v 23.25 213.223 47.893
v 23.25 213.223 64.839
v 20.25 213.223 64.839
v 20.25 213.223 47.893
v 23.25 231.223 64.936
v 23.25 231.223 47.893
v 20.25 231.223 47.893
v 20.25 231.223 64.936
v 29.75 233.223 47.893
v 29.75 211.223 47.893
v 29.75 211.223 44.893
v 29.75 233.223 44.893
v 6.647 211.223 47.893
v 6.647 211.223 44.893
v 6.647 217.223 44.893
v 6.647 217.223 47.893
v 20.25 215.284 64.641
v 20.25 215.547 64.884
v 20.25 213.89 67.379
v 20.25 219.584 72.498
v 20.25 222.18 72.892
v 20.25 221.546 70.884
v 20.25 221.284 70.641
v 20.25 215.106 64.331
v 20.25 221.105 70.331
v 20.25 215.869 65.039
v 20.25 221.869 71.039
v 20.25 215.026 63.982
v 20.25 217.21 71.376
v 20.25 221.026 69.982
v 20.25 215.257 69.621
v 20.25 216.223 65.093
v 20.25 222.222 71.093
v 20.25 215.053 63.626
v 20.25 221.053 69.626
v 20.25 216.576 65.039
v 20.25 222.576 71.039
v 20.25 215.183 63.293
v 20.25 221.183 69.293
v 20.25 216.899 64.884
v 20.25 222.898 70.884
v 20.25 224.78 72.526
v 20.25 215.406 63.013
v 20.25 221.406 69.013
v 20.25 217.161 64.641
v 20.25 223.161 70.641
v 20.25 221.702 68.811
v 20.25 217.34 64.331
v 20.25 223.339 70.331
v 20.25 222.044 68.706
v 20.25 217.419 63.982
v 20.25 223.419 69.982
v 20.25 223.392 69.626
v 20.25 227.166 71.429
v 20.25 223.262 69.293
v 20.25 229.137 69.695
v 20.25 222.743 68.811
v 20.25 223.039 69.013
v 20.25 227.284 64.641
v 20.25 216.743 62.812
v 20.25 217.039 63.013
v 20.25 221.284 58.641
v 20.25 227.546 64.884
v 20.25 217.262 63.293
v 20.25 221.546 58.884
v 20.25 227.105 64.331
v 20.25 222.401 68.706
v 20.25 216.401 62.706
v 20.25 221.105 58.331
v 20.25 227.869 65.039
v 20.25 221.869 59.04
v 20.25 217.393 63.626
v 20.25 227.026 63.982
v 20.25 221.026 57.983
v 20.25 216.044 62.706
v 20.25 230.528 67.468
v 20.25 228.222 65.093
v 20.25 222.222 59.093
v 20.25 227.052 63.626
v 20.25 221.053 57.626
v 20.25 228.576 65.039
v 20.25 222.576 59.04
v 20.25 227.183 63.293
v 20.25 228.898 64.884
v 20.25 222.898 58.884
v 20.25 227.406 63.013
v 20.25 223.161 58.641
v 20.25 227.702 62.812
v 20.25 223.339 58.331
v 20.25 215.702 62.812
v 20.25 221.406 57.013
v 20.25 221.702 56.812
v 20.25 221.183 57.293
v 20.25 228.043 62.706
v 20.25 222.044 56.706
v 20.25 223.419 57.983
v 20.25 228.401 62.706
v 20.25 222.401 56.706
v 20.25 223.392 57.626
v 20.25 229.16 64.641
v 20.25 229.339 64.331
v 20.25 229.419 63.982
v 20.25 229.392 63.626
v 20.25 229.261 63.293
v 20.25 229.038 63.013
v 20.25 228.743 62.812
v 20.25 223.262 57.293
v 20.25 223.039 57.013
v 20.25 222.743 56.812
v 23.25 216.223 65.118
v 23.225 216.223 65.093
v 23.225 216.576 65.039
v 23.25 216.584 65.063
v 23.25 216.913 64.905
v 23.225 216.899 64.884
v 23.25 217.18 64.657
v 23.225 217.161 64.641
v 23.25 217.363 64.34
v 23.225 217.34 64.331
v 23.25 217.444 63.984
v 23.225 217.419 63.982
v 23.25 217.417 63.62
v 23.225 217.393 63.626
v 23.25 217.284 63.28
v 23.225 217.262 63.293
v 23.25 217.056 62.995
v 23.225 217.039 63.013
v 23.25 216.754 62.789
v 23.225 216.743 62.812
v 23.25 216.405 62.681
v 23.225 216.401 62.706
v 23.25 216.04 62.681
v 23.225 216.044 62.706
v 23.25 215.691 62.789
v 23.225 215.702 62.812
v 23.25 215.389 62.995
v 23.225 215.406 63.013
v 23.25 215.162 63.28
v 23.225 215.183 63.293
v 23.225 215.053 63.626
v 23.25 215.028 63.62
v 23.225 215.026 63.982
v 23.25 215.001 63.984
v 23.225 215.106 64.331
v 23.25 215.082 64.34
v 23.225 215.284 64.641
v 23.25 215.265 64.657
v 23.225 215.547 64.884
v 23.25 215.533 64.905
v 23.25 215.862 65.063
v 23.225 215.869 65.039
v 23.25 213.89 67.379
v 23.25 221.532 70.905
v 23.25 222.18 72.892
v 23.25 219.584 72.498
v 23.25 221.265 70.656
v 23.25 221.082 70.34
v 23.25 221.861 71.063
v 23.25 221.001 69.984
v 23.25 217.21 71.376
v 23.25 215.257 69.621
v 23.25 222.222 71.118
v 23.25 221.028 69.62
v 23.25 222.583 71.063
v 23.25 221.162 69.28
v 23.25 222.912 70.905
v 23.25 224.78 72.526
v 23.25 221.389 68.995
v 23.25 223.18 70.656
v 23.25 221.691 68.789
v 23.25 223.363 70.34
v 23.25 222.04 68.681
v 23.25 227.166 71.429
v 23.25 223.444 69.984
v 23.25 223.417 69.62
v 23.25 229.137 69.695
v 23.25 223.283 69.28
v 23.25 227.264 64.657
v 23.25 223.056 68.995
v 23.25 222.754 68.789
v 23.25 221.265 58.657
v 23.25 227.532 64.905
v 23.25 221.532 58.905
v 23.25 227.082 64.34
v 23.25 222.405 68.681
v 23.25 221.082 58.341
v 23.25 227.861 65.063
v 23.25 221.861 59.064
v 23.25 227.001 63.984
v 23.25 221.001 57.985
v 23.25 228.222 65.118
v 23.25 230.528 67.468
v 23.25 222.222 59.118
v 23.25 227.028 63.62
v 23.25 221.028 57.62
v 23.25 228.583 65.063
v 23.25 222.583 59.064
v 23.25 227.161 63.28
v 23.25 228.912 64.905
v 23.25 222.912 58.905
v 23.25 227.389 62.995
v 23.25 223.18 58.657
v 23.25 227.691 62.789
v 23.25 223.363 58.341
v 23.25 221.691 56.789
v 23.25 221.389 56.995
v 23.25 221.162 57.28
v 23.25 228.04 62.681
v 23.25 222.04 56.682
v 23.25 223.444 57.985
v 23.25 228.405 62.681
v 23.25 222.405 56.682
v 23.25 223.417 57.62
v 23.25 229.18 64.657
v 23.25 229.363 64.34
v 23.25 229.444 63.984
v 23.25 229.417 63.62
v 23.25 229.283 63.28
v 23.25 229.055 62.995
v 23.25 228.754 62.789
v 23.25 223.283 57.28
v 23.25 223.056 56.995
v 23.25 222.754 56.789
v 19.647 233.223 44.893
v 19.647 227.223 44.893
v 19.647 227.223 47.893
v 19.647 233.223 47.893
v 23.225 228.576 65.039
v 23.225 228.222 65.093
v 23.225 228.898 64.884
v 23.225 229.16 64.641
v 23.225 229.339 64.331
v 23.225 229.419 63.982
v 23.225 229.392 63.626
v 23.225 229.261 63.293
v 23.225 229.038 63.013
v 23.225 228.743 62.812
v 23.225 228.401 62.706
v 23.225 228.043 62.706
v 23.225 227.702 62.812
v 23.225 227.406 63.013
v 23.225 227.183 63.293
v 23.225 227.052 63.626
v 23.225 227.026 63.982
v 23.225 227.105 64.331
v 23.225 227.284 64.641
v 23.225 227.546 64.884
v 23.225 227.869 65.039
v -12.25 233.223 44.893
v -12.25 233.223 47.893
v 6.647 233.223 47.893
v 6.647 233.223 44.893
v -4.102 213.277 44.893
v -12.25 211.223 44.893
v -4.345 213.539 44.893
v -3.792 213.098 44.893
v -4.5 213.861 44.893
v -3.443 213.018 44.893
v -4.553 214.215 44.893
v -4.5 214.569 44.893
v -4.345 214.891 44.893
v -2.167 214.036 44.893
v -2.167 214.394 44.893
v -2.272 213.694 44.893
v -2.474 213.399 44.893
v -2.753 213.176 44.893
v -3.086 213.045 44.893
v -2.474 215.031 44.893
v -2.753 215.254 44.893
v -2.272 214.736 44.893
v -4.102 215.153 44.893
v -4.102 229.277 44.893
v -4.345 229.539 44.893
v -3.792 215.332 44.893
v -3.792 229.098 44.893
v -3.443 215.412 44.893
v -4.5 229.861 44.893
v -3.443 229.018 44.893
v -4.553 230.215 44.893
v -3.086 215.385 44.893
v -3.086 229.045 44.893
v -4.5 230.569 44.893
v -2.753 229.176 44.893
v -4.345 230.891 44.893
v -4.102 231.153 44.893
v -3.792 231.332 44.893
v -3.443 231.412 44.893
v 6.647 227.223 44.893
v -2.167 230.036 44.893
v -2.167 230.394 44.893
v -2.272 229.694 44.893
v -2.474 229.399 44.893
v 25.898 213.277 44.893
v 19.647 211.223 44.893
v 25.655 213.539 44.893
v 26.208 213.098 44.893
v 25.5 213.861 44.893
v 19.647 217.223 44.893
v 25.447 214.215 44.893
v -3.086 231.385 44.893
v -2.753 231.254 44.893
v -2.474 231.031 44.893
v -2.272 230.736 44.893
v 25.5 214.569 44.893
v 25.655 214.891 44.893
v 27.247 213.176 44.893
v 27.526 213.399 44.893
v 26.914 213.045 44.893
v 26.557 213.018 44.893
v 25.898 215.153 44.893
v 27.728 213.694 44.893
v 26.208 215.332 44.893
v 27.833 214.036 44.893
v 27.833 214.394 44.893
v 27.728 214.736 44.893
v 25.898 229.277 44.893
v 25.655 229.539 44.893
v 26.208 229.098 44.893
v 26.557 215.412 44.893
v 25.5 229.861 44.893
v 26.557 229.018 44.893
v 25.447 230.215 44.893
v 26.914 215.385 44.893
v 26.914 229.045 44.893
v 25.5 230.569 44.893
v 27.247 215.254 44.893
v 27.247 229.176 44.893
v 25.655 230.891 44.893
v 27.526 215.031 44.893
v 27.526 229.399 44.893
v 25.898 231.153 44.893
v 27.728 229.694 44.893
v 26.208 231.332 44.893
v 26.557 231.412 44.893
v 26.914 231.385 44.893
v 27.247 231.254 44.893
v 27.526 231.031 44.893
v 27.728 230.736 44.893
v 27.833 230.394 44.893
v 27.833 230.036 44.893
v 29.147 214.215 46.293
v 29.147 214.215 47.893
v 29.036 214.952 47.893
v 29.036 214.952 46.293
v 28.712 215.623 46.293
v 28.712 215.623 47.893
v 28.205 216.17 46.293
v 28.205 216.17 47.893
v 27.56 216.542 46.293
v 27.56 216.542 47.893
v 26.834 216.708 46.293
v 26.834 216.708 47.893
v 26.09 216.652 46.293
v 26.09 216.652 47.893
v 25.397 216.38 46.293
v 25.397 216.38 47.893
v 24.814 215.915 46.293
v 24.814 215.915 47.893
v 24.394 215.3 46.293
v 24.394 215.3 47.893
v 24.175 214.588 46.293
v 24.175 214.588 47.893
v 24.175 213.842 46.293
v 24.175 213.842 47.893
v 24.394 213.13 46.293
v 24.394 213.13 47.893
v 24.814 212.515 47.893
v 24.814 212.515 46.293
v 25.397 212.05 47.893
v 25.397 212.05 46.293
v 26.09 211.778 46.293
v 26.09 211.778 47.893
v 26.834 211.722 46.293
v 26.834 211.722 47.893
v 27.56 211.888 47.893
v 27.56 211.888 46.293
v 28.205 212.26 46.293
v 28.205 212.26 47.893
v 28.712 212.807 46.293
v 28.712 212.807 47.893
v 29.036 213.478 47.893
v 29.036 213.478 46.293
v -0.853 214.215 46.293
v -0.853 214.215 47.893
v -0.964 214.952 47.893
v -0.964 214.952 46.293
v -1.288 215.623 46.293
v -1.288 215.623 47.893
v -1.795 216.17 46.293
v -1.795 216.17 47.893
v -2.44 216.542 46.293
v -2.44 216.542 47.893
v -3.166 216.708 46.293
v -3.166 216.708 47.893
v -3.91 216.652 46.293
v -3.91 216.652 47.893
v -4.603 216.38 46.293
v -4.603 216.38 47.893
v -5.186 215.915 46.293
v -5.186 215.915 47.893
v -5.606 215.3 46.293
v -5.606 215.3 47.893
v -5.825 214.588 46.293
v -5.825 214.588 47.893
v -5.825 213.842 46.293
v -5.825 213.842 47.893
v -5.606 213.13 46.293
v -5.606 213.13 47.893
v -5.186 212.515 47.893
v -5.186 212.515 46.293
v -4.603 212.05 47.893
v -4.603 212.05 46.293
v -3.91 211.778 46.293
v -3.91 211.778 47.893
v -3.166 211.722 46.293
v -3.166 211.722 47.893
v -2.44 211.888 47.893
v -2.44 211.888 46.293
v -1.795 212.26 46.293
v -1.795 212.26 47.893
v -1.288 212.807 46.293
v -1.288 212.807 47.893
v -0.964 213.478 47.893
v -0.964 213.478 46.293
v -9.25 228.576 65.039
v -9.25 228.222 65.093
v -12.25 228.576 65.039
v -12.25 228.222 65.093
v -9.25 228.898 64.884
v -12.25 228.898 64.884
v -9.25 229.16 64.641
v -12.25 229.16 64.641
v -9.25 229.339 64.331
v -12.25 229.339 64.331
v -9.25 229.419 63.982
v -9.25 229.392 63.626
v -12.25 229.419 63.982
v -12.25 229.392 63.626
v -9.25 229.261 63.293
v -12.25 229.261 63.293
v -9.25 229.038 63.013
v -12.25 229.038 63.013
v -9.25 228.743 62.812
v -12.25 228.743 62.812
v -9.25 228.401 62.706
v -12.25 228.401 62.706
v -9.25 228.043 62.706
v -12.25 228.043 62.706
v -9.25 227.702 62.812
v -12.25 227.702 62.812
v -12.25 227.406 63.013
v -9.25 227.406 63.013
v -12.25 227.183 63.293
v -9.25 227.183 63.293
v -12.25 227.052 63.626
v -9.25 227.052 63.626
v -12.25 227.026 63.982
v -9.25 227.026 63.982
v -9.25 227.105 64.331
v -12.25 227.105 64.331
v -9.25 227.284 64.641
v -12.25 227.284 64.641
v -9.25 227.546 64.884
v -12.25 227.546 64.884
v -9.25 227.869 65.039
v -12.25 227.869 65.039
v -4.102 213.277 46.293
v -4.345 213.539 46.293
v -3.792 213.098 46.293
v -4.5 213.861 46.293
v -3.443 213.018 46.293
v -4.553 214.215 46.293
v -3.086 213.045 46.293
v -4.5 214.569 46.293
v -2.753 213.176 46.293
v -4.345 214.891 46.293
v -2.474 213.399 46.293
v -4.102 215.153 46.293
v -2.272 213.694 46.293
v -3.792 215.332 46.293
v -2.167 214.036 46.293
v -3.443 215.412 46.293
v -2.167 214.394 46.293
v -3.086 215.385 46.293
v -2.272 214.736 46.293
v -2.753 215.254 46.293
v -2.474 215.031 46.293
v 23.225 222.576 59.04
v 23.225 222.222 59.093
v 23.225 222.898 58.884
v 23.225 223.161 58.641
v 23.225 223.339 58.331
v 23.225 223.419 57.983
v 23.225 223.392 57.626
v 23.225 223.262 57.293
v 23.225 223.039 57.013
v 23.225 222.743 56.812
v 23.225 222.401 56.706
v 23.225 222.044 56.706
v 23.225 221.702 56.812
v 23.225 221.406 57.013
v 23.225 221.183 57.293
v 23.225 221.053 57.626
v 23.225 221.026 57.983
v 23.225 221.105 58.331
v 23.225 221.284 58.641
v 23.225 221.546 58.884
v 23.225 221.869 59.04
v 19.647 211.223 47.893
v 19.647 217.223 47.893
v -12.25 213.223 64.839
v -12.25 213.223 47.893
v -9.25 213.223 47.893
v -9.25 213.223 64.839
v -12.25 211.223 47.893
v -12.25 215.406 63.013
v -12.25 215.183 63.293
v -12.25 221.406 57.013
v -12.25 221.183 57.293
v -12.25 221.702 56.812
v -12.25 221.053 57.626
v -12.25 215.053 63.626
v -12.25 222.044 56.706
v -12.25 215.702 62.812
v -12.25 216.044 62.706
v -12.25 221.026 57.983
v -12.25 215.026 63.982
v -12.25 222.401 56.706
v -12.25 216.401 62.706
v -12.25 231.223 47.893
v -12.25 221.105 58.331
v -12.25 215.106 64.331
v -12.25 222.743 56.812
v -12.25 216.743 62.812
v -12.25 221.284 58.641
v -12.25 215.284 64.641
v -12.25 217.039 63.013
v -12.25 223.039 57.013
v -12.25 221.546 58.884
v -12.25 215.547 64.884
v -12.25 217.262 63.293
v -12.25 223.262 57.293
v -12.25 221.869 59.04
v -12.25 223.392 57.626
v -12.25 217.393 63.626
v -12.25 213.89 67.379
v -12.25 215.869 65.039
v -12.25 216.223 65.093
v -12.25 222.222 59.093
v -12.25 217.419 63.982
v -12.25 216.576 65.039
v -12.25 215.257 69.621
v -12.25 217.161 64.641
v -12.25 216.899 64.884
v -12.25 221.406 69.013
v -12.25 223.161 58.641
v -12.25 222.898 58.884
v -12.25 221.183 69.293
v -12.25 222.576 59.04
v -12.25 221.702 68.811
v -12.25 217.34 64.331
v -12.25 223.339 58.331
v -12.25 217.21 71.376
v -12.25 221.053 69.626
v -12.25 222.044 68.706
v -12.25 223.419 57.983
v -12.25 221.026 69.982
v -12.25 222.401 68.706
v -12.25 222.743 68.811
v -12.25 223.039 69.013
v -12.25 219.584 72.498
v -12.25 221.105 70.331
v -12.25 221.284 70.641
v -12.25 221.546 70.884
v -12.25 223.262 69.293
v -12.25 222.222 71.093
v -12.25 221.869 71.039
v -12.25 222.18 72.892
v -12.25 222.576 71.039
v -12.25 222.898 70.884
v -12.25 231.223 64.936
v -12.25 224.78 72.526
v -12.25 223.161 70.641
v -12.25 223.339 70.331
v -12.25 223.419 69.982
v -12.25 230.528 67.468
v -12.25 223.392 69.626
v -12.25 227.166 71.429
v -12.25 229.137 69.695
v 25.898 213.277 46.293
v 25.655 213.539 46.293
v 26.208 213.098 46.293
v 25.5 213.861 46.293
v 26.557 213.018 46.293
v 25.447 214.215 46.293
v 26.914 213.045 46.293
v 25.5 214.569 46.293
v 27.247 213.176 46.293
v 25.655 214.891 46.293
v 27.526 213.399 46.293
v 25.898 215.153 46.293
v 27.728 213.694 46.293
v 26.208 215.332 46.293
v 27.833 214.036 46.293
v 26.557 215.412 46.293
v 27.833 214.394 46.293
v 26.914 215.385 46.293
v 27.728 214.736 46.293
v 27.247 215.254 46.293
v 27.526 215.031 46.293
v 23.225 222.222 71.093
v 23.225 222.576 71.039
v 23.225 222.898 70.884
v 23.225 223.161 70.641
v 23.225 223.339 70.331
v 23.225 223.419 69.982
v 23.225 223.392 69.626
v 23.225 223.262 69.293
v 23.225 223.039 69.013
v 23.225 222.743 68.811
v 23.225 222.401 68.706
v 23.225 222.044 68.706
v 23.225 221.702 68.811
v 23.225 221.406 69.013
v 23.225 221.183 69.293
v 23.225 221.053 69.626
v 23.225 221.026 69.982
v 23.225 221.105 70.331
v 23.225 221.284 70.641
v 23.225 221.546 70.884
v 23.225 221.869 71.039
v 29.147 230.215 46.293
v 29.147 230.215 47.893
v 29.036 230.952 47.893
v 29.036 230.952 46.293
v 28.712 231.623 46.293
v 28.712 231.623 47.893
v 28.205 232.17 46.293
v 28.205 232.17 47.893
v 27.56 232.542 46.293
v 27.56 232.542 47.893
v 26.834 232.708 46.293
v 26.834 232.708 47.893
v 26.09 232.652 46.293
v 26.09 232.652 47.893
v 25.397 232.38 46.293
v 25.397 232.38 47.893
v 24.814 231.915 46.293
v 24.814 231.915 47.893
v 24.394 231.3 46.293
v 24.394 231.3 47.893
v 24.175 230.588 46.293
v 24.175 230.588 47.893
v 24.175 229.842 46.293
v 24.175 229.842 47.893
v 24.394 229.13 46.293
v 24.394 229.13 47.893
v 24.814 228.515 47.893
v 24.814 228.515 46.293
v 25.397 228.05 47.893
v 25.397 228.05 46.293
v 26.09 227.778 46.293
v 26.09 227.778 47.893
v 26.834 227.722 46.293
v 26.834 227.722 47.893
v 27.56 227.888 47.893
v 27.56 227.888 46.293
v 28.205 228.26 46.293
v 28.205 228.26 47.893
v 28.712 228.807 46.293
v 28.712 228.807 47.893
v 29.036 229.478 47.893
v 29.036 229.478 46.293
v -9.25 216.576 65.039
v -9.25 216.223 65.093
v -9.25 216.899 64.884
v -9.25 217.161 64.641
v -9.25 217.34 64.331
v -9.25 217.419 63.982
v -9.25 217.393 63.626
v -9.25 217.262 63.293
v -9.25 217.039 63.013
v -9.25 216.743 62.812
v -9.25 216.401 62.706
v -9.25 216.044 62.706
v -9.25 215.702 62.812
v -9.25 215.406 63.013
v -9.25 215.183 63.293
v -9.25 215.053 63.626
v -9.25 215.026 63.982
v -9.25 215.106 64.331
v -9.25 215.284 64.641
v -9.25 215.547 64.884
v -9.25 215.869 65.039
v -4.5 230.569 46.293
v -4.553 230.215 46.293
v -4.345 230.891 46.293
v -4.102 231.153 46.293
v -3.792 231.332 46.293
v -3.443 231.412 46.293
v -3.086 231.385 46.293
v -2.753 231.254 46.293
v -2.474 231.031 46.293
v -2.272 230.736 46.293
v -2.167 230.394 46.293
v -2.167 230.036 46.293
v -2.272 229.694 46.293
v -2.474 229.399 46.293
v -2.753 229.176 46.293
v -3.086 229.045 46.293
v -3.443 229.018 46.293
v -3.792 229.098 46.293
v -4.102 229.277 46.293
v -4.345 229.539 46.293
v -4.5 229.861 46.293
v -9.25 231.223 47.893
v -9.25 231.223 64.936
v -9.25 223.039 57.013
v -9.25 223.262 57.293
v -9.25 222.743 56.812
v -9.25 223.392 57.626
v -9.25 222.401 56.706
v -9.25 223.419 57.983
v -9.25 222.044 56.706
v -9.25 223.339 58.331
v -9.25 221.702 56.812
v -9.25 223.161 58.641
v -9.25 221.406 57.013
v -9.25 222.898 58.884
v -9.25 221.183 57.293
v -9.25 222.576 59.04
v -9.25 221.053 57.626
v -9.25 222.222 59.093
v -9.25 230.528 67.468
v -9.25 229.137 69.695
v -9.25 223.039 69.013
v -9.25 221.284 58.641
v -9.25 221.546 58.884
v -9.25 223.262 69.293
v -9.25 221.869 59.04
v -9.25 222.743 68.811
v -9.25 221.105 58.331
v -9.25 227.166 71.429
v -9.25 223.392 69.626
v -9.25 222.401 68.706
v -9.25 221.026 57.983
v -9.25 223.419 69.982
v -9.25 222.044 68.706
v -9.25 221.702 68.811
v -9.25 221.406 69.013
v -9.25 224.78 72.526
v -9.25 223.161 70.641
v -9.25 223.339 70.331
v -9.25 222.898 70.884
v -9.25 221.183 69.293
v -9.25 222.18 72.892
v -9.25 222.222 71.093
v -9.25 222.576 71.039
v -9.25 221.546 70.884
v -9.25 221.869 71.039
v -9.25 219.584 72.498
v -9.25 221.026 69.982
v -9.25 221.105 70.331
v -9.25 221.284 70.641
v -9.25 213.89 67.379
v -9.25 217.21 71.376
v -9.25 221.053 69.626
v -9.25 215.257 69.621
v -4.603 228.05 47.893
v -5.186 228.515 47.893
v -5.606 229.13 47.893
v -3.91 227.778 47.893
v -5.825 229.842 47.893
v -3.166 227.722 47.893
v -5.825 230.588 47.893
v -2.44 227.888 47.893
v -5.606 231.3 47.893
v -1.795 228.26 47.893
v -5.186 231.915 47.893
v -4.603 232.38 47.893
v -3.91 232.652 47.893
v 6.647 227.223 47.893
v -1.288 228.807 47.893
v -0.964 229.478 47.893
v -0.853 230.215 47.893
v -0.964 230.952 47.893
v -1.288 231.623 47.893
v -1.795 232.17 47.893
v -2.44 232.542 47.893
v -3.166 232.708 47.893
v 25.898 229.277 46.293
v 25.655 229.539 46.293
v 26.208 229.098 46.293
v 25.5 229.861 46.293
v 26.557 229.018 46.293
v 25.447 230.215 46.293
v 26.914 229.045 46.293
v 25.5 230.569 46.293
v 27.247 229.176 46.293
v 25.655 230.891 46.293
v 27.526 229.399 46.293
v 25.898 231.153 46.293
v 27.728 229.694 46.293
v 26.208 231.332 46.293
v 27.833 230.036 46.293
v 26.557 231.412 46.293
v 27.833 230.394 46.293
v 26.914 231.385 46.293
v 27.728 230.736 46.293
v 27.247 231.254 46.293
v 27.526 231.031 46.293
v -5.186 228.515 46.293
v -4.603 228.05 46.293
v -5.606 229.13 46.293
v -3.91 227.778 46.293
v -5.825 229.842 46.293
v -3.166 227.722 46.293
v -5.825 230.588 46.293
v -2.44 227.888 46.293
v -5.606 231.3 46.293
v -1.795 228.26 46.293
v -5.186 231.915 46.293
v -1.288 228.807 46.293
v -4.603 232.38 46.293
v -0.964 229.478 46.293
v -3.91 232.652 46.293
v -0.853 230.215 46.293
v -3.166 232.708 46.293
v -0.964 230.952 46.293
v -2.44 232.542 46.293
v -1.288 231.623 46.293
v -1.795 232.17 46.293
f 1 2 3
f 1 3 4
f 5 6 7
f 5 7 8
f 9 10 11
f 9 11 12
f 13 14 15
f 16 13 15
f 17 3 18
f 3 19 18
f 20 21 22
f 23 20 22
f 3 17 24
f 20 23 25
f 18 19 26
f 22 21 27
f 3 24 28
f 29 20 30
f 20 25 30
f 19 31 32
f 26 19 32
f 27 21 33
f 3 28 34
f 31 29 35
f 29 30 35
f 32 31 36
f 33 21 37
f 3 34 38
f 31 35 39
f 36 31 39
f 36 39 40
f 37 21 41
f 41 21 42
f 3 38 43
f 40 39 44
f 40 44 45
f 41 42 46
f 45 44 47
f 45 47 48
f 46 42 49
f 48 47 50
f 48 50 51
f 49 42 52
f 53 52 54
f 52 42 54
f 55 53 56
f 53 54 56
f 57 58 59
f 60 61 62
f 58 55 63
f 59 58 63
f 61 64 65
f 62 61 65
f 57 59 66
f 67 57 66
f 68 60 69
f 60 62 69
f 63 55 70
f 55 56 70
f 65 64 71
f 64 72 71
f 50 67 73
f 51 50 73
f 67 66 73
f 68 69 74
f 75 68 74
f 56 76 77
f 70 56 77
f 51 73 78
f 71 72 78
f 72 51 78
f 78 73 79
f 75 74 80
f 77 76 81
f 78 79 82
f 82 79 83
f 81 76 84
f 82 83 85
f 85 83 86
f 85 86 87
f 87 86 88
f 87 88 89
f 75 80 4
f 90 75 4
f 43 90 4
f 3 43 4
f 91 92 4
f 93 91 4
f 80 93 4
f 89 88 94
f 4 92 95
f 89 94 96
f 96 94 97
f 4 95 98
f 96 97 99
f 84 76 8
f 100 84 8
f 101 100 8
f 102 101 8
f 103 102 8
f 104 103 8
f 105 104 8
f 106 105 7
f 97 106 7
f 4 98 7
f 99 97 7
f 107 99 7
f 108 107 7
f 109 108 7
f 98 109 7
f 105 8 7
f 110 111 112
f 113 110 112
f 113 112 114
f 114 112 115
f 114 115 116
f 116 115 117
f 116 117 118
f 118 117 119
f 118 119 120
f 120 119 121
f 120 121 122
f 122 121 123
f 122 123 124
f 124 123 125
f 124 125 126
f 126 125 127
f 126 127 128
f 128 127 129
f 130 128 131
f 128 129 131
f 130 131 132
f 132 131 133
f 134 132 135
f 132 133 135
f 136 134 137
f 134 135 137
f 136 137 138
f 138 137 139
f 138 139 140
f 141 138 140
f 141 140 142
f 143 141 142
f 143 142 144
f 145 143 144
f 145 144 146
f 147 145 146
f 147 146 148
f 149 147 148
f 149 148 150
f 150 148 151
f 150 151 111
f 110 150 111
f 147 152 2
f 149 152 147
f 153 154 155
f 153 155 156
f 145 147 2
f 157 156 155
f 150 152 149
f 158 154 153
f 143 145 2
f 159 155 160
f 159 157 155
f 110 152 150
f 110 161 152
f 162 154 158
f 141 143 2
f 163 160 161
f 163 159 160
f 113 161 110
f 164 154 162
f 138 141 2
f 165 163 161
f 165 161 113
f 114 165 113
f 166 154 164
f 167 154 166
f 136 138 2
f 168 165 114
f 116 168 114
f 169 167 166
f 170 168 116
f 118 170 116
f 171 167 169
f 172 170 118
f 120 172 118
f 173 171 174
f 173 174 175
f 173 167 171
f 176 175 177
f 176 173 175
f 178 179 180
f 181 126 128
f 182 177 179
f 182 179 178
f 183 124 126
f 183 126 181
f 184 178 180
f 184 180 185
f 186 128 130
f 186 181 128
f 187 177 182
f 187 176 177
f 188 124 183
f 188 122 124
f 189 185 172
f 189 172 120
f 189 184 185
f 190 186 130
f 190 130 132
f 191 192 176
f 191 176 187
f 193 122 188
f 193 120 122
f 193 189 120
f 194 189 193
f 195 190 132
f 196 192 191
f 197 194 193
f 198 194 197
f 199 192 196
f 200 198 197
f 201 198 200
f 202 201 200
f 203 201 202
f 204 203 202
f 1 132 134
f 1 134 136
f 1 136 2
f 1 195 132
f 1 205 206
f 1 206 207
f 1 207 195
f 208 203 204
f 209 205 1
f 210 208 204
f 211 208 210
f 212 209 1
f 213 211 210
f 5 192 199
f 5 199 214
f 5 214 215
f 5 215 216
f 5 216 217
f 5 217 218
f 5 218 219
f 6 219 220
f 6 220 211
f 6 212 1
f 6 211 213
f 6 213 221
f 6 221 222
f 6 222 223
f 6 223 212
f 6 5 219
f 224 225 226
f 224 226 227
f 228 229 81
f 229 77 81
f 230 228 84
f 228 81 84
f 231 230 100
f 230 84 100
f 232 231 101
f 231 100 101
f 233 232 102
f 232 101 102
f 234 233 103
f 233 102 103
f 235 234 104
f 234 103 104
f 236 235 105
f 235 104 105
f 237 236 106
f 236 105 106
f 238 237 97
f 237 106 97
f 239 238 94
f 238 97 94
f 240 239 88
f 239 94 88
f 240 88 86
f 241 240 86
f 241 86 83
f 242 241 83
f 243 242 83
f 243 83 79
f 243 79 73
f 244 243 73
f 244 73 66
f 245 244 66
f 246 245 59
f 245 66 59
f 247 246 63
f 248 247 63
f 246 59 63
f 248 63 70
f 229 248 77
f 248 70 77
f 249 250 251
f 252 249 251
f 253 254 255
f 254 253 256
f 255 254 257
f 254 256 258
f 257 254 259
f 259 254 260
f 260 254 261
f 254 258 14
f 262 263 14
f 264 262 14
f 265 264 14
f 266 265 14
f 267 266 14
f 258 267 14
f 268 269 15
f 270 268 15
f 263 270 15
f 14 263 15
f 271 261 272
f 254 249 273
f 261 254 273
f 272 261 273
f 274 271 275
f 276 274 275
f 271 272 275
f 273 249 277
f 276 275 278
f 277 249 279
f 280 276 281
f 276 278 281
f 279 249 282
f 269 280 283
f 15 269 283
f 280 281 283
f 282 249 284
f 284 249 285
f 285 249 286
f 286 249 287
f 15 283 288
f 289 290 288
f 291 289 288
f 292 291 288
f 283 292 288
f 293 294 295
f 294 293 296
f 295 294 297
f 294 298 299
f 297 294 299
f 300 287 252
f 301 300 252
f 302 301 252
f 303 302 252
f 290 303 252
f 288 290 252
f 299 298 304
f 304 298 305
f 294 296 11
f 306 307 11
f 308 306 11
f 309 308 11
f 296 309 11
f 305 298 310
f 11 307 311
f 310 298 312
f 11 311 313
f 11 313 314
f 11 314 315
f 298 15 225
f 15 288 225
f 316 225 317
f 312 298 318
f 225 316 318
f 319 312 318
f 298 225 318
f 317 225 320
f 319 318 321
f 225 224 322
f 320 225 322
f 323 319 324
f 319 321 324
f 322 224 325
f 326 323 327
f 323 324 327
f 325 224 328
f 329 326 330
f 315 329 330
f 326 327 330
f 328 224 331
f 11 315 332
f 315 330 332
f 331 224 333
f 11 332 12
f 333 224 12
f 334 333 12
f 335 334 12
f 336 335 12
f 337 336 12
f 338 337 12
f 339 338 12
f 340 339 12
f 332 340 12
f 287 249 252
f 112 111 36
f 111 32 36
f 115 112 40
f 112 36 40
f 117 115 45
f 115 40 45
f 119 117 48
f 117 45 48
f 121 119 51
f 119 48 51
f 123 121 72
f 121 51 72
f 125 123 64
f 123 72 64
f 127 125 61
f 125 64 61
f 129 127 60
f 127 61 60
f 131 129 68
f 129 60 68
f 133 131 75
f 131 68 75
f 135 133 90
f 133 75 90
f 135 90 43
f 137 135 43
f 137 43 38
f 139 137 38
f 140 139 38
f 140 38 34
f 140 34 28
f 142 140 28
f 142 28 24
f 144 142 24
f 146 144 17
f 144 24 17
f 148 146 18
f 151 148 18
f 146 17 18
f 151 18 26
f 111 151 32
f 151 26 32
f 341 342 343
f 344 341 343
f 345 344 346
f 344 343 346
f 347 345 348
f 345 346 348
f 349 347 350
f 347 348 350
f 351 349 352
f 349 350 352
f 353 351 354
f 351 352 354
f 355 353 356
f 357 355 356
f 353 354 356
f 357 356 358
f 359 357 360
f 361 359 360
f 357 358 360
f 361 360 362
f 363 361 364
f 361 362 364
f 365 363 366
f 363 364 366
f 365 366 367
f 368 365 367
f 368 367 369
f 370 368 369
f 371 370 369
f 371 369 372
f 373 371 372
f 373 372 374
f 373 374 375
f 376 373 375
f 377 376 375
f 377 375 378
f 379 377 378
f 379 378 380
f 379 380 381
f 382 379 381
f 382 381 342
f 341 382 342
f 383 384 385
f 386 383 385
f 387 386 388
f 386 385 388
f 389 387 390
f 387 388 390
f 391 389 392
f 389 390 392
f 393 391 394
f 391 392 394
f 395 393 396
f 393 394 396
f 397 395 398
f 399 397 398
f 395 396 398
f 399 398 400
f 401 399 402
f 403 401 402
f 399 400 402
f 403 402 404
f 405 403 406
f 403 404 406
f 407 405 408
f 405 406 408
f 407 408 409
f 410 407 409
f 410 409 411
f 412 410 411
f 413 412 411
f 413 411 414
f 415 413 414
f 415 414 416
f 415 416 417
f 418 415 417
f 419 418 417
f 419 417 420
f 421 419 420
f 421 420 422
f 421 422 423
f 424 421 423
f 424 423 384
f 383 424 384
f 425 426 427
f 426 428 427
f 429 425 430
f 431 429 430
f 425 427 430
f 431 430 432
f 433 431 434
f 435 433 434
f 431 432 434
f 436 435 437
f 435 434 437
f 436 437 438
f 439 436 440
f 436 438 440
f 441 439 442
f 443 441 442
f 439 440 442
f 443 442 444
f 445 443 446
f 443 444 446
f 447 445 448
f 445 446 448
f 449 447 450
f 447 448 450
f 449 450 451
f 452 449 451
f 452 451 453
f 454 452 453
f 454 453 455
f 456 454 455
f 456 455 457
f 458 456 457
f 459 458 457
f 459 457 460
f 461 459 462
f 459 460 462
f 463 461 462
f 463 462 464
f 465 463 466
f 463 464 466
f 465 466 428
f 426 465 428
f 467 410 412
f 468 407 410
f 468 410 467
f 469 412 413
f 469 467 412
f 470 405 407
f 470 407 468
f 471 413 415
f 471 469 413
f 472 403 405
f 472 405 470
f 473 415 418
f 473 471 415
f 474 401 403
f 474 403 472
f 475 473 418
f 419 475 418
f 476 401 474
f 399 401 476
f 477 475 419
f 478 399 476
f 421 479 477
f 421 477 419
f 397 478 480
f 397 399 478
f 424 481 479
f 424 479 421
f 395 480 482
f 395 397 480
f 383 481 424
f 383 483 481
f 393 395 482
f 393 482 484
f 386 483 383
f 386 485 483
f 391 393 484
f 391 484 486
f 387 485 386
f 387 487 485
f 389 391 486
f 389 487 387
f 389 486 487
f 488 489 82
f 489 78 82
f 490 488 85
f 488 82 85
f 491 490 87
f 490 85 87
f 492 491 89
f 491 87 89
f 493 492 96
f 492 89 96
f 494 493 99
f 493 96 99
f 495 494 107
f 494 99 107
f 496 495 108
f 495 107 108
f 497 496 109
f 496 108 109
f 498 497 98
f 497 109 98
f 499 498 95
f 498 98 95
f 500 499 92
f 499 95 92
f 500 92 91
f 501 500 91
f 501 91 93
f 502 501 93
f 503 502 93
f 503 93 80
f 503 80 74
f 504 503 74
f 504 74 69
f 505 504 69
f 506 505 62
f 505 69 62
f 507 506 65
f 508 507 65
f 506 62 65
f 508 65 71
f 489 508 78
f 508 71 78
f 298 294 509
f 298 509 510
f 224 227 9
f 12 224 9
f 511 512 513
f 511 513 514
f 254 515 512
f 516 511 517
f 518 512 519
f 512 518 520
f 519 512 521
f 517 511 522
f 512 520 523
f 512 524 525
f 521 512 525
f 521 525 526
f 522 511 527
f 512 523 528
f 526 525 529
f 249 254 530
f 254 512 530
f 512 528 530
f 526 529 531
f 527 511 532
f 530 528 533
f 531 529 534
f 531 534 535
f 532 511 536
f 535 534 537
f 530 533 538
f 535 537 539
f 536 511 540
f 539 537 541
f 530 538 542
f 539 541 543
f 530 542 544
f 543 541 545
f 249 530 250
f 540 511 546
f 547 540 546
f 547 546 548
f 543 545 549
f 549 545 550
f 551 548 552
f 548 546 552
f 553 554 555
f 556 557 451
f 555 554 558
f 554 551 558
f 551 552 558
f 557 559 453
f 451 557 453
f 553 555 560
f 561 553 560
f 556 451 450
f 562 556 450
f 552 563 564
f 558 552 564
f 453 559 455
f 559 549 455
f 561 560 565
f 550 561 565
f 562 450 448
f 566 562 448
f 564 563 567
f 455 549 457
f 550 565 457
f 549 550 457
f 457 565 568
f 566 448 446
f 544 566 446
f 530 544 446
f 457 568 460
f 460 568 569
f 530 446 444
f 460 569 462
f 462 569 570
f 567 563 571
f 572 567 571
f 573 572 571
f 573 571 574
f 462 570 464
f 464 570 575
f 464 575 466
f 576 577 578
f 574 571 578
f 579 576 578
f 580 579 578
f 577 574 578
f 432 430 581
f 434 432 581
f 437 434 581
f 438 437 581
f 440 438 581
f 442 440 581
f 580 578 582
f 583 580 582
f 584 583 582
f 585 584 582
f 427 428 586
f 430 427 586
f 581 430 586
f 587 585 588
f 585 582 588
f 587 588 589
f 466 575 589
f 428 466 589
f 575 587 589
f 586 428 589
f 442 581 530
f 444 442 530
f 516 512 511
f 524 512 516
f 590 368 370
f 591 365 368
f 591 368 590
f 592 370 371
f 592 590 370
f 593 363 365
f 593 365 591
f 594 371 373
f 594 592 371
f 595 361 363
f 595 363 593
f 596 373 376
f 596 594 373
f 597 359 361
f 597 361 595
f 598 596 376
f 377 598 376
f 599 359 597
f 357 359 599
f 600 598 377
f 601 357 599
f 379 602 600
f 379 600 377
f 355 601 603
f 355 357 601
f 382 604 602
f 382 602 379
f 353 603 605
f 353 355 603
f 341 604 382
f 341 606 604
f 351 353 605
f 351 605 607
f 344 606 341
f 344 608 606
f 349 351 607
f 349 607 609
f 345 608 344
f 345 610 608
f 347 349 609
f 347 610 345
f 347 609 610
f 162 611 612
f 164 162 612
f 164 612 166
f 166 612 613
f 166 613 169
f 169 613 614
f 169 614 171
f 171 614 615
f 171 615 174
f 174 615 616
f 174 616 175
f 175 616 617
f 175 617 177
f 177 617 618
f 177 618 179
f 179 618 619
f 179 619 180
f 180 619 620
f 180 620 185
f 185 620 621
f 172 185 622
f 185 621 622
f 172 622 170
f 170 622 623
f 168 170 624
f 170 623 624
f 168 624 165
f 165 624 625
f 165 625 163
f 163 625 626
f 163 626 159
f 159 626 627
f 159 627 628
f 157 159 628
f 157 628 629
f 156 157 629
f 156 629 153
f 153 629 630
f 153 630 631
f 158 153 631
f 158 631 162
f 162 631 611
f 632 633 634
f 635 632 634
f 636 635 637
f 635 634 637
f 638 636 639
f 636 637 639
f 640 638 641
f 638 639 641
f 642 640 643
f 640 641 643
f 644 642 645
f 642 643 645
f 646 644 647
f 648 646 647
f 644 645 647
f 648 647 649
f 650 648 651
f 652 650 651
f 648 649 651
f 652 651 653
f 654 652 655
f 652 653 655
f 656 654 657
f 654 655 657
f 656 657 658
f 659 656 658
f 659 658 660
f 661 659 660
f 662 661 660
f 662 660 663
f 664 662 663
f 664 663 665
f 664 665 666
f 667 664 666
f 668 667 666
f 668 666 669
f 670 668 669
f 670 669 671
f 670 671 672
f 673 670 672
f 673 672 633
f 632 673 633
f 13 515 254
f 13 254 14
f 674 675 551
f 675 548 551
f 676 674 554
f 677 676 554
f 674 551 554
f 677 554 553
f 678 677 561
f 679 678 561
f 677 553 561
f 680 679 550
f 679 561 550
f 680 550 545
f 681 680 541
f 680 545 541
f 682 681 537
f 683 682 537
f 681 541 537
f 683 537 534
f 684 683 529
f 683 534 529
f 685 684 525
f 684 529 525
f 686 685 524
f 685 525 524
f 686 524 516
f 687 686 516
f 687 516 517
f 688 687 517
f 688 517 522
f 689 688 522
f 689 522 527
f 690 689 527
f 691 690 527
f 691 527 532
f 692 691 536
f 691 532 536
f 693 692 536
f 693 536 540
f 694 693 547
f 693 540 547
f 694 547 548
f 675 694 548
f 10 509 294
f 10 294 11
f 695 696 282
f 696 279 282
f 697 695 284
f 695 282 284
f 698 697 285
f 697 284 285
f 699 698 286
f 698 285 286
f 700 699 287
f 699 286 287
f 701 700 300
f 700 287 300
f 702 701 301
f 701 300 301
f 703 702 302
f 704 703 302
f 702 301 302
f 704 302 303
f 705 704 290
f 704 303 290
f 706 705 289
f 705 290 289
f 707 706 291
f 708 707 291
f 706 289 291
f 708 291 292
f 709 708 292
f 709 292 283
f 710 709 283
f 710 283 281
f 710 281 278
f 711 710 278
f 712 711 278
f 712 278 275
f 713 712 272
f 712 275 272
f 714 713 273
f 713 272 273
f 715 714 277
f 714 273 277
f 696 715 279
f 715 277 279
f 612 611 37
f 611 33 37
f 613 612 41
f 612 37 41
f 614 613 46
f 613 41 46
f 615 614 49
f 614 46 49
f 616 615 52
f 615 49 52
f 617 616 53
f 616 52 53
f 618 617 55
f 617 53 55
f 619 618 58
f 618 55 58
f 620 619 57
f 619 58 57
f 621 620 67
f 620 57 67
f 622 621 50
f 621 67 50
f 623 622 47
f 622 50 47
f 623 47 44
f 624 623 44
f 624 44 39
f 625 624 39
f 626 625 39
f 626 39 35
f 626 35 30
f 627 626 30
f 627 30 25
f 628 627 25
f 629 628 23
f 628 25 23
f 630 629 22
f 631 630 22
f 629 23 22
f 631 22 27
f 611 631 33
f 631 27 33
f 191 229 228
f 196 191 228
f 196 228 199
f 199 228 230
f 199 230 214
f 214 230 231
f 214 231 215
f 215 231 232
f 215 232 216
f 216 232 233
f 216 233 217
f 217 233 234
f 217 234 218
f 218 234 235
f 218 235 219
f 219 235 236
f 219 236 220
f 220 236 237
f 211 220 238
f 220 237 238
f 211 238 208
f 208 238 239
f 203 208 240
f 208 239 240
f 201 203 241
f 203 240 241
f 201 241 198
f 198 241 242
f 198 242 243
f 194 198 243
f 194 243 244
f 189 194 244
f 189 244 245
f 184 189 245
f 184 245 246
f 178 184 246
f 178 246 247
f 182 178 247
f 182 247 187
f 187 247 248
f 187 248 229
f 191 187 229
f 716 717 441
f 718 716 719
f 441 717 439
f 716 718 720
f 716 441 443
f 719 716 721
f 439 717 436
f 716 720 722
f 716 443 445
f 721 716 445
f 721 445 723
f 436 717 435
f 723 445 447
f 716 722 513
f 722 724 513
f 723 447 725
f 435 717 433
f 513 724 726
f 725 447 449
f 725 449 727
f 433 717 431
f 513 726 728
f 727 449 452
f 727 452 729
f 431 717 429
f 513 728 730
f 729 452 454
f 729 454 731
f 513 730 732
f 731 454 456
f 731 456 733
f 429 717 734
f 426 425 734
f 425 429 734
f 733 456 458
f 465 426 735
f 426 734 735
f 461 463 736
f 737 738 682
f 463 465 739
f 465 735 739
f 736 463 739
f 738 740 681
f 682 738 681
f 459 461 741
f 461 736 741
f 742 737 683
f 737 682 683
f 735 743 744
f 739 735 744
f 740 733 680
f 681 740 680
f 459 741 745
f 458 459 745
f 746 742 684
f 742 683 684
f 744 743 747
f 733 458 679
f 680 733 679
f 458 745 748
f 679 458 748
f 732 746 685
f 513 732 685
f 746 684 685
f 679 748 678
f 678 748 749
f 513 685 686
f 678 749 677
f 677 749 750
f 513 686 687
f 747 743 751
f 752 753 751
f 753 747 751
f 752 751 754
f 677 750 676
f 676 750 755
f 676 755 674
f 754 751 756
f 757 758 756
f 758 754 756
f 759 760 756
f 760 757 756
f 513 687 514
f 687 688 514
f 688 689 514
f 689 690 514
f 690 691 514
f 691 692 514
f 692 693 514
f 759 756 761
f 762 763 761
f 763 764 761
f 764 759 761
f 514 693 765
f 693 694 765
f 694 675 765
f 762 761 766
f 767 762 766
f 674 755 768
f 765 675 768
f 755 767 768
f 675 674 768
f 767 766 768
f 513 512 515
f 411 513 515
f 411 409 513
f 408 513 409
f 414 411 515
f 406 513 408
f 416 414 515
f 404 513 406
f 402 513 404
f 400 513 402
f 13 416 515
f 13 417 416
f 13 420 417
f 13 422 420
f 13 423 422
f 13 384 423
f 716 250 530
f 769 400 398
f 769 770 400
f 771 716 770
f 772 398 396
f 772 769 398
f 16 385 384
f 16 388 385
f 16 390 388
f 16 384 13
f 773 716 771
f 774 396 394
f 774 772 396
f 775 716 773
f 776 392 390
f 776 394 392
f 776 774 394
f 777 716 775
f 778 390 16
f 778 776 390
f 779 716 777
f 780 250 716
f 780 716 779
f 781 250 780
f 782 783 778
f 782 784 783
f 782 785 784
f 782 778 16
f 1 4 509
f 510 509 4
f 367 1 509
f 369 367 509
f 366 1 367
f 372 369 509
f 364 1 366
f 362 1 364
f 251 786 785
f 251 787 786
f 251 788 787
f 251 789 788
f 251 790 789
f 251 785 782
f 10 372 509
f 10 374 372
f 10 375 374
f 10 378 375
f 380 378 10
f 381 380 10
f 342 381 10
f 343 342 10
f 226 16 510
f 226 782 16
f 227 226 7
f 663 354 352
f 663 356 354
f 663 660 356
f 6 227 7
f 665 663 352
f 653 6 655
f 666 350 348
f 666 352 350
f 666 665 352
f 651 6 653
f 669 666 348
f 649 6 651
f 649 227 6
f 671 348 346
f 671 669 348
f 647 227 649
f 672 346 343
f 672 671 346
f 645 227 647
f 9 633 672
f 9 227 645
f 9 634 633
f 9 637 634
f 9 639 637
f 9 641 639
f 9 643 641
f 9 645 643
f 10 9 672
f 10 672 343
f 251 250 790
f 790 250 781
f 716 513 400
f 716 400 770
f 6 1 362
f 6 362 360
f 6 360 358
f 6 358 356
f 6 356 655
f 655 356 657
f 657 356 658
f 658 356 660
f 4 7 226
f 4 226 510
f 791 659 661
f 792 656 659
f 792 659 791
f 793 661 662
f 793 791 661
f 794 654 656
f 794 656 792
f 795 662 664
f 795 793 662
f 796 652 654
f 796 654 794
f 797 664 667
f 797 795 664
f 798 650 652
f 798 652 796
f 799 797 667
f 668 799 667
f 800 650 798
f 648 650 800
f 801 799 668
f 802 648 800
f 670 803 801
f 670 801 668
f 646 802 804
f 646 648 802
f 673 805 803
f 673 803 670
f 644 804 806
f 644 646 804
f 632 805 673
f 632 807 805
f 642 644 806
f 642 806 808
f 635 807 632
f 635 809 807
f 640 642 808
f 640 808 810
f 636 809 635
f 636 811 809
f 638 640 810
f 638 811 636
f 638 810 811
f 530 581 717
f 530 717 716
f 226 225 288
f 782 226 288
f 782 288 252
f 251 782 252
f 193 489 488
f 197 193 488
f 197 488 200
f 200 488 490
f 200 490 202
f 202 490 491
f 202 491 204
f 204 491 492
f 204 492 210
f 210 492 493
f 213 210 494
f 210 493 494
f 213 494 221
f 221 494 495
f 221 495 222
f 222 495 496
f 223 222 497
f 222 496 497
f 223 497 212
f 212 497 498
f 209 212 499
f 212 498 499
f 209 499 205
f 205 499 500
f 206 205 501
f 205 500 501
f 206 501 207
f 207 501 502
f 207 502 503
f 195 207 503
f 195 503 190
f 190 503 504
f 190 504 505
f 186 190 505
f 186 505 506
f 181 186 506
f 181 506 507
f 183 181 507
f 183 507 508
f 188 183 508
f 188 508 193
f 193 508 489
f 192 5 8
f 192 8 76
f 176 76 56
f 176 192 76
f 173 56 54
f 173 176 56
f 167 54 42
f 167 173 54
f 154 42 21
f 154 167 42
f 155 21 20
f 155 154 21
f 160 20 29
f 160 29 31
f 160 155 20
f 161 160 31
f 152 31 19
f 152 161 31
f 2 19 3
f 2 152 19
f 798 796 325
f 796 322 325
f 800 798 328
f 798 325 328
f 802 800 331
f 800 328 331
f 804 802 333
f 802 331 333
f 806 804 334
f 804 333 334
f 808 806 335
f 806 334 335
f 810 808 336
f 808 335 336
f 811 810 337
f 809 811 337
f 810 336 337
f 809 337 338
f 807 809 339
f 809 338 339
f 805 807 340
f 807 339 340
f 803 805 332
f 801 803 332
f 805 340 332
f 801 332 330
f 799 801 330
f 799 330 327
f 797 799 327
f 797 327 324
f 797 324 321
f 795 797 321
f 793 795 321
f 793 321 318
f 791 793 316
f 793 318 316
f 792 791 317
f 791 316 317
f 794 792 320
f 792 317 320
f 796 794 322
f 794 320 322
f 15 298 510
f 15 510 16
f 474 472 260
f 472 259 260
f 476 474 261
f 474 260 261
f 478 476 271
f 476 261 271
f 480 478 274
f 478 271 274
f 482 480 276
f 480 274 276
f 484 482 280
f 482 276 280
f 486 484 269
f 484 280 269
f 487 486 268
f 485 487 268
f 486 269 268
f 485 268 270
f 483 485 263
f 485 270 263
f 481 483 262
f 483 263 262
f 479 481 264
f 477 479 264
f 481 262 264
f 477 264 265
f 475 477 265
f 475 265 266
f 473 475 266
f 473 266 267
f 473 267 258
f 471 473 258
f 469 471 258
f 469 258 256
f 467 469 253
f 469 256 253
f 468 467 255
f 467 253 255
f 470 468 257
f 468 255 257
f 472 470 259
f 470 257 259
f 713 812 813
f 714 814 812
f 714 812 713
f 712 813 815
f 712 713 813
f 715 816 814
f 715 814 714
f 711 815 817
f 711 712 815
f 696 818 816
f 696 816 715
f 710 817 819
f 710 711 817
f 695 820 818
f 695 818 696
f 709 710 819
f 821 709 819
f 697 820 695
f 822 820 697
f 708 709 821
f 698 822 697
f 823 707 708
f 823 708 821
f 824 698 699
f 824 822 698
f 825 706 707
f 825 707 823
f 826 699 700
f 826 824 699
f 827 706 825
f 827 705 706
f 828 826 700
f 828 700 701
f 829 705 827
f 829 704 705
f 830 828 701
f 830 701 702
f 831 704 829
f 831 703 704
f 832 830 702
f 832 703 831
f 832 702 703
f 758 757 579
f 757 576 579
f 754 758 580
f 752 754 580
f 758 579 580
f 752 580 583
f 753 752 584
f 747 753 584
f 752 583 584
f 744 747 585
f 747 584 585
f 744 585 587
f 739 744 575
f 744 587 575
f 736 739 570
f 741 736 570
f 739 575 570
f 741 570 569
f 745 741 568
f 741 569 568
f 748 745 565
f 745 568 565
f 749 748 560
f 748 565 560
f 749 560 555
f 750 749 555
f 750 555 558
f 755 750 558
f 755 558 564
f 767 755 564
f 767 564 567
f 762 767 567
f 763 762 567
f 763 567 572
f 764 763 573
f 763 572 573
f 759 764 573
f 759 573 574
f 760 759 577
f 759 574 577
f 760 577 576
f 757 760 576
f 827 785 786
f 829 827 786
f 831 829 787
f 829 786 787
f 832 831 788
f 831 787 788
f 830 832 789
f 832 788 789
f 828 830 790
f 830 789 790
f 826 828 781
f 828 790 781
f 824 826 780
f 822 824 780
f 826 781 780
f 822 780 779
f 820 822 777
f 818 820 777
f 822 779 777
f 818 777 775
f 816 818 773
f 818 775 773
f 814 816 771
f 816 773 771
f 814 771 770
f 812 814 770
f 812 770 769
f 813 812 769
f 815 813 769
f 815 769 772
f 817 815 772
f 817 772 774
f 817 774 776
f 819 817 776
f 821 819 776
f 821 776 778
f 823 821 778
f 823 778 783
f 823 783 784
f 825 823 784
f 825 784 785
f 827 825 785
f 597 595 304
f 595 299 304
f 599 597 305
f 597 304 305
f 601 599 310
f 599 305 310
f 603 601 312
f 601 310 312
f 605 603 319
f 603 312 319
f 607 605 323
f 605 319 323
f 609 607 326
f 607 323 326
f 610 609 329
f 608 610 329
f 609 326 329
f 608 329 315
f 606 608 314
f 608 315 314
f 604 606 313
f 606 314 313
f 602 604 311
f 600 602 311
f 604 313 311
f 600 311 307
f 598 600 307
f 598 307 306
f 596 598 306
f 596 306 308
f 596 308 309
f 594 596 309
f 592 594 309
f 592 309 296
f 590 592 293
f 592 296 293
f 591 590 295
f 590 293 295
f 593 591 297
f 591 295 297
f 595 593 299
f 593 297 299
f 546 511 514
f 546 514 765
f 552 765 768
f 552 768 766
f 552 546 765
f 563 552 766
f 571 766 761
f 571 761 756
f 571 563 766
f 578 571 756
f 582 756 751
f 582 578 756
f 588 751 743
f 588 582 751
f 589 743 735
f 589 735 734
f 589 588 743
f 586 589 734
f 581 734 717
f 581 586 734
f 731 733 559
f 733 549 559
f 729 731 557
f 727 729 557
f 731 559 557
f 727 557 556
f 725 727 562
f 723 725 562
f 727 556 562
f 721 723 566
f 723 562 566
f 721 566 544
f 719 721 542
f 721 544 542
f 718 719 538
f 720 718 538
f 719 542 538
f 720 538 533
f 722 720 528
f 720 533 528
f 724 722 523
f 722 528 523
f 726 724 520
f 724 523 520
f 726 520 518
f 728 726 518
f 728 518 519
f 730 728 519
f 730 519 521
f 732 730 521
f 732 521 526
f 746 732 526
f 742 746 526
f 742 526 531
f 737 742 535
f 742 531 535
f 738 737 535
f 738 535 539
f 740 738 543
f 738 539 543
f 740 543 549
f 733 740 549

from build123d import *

# Parameters (mm, degrees)
SKETCH1_W                                        = 42
SKETCH1_H                                        = 22
BOSS_EXTRUDE1_DEPTH                              = 3
SKETCH2_W                                        = 13
SKETCH2_H                                        = 6
CUT_EXTRUDE1_DEPTH                               = 4
SKETCH3_W                                        = 13
SKETCH3_H                                        = 6
CUT_EXTRUDE2_DEPTH                               = 4
BOSS_EXTRUDE2_DEPTH                              = 3
BOSS_EXTRUDE3_DEPTH                              = 3
M2_CLEARANCE_HOLE1_D                             = 2.4
M2_CLEARANCE_HOLE1_CSINK_D                       = 2.45
M2_CLEARANCE_HOLE1_CSINK_ANGLE                   = 90
CBORE_FOR_M2_PAN_HEAD_MACHINE_SCREW1_D           = 2.4
CBORE_FOR_M2_PAN_HEAD_MACHINE_SCREW1_CBORE_D     = 5
CBORE_FOR_M2_PAN_HEAD_MACHINE_SCREW1_CBORE_DEPTH = 1.6


with BuildPart() as part:
    # Sketch1 → Boss-Extrude1 (new body)
    with BuildSketch(Plane.XY.offset(47.892560215)):
        with Locations((8.75, 222.222621224)):
            Rectangle(SKETCH1_W, SKETCH1_H)
    extrude(amount=-BOSS_EXTRUDE1_DEPTH)

    # Sketch2 → Cut-Extrude1 (cut, through all)
    with BuildSketch(Plane(origin=(0, 0, 44.892560215), x_dir=(-1, 0, 0), z_dir=(0, 0, -1))):
        with Locations((-13.146676675, 230.222621224)):
            Rectangle(SKETCH2_W, SKETCH2_H)
    extrude(amount=-CUT_EXTRUDE1_DEPTH, mode=Mode.SUBTRACT)

    # Sketch3 → Cut-Extrude2 (cut, through all)
    with BuildSketch(Plane(origin=(0, 0, 44.892560215), x_dir=(-1, 0, 0), z_dir=(0, 0, -1))):
        with Locations((-13.146676675, 214.222621224)):
            Rectangle(SKETCH3_W, SKETCH3_H)
    extrude(amount=-CUT_EXTRUDE2_DEPTH, mode=Mode.SUBTRACT)

    # Sketch4 → Boss-Extrude2 (add)
    with BuildSketch(Plane(origin=(-12.25, 0, 0), x_dir=(0, -1, 0), z_dir=(-1, 0, 0))):
        with BuildLine():
            Line((-231.222621224, 64.935707597), (-231.222621224, 47.892560215))
            Line((-231.222621224, 47.892560215), (-213.222621224, 47.892560215))
            Line((-213.222621224, 47.892560215), (-213.222621224, 64.839486293))
            ThreePointArc((-213.222621224, 64.839486293), (-222.179830351, 72.892432503), (-231.222621224, 64.935707597))
        make_face()
    extrude(amount=-BOSS_EXTRUDE2_DEPTH)

    # Sketch5 → Boss-Extrude3 (add)
    with BuildSketch(Plane(origin=(23.25, 0, 0), x_dir=(0, 0, -1), z_dir=(1, 0, 0))):
        with BuildLine():
            Line((-64.839486293, 213.222621224), (-47.892560215, 213.222621224))
            Line((-47.892560215, 213.222621224), (-47.892560215, 231.222621224))
            Line((-47.892560215, 231.222621224), (-64.935707597, 231.222621224))
            ThreePointArc((-64.935707597, 231.222621224), (-72.892432503, 222.179830351), (-64.839486293, 213.222621224))
        make_face()
    extrude(amount=-BOSS_EXTRUDE3_DEPTH)

    # M2 Clearance Hole1 (through all)
    with Locations(Plane(origin=(23.25, 0, 0), x_dir=(0, 0, -1), z_dir=(1, 0, 0))):
        with Locations((-63.892759177, 228.222223301), (-69.892560215, 222.222422263), (-63.892759177, 216.222621224), (-57.892958138, 222.222422263)):
            CounterSinkHole(M2_CLEARANCE_HOLE1_D / 2, M2_CLEARANCE_HOLE1_CSINK_D / 2, counter_sink_angle=M2_CLEARANCE_HOLE1_CSINK_ANGLE)

    # CBORE for M2 Pan Head Machine Screw1 (through all)
    with Locations(Plane.XY.offset(47.892560215)):
        with Locations((-3.353323325, 230.214980721), (-3.353323325, 214.214980721), (26.646676675, 214.214980721), (26.646676675, 230.214980721)):
            CounterBoreHole(CBORE_FOR_M2_PAN_HEAD_MACHINE_SCREW1_D / 2, CBORE_FOR_M2_PAN_HEAD_MACHINE_SCREW1_CBORE_D / 2, CBORE_FOR_M2_PAN_HEAD_MACHINE_SCREW1_CBORE_DEPTH)


solid = part.part
